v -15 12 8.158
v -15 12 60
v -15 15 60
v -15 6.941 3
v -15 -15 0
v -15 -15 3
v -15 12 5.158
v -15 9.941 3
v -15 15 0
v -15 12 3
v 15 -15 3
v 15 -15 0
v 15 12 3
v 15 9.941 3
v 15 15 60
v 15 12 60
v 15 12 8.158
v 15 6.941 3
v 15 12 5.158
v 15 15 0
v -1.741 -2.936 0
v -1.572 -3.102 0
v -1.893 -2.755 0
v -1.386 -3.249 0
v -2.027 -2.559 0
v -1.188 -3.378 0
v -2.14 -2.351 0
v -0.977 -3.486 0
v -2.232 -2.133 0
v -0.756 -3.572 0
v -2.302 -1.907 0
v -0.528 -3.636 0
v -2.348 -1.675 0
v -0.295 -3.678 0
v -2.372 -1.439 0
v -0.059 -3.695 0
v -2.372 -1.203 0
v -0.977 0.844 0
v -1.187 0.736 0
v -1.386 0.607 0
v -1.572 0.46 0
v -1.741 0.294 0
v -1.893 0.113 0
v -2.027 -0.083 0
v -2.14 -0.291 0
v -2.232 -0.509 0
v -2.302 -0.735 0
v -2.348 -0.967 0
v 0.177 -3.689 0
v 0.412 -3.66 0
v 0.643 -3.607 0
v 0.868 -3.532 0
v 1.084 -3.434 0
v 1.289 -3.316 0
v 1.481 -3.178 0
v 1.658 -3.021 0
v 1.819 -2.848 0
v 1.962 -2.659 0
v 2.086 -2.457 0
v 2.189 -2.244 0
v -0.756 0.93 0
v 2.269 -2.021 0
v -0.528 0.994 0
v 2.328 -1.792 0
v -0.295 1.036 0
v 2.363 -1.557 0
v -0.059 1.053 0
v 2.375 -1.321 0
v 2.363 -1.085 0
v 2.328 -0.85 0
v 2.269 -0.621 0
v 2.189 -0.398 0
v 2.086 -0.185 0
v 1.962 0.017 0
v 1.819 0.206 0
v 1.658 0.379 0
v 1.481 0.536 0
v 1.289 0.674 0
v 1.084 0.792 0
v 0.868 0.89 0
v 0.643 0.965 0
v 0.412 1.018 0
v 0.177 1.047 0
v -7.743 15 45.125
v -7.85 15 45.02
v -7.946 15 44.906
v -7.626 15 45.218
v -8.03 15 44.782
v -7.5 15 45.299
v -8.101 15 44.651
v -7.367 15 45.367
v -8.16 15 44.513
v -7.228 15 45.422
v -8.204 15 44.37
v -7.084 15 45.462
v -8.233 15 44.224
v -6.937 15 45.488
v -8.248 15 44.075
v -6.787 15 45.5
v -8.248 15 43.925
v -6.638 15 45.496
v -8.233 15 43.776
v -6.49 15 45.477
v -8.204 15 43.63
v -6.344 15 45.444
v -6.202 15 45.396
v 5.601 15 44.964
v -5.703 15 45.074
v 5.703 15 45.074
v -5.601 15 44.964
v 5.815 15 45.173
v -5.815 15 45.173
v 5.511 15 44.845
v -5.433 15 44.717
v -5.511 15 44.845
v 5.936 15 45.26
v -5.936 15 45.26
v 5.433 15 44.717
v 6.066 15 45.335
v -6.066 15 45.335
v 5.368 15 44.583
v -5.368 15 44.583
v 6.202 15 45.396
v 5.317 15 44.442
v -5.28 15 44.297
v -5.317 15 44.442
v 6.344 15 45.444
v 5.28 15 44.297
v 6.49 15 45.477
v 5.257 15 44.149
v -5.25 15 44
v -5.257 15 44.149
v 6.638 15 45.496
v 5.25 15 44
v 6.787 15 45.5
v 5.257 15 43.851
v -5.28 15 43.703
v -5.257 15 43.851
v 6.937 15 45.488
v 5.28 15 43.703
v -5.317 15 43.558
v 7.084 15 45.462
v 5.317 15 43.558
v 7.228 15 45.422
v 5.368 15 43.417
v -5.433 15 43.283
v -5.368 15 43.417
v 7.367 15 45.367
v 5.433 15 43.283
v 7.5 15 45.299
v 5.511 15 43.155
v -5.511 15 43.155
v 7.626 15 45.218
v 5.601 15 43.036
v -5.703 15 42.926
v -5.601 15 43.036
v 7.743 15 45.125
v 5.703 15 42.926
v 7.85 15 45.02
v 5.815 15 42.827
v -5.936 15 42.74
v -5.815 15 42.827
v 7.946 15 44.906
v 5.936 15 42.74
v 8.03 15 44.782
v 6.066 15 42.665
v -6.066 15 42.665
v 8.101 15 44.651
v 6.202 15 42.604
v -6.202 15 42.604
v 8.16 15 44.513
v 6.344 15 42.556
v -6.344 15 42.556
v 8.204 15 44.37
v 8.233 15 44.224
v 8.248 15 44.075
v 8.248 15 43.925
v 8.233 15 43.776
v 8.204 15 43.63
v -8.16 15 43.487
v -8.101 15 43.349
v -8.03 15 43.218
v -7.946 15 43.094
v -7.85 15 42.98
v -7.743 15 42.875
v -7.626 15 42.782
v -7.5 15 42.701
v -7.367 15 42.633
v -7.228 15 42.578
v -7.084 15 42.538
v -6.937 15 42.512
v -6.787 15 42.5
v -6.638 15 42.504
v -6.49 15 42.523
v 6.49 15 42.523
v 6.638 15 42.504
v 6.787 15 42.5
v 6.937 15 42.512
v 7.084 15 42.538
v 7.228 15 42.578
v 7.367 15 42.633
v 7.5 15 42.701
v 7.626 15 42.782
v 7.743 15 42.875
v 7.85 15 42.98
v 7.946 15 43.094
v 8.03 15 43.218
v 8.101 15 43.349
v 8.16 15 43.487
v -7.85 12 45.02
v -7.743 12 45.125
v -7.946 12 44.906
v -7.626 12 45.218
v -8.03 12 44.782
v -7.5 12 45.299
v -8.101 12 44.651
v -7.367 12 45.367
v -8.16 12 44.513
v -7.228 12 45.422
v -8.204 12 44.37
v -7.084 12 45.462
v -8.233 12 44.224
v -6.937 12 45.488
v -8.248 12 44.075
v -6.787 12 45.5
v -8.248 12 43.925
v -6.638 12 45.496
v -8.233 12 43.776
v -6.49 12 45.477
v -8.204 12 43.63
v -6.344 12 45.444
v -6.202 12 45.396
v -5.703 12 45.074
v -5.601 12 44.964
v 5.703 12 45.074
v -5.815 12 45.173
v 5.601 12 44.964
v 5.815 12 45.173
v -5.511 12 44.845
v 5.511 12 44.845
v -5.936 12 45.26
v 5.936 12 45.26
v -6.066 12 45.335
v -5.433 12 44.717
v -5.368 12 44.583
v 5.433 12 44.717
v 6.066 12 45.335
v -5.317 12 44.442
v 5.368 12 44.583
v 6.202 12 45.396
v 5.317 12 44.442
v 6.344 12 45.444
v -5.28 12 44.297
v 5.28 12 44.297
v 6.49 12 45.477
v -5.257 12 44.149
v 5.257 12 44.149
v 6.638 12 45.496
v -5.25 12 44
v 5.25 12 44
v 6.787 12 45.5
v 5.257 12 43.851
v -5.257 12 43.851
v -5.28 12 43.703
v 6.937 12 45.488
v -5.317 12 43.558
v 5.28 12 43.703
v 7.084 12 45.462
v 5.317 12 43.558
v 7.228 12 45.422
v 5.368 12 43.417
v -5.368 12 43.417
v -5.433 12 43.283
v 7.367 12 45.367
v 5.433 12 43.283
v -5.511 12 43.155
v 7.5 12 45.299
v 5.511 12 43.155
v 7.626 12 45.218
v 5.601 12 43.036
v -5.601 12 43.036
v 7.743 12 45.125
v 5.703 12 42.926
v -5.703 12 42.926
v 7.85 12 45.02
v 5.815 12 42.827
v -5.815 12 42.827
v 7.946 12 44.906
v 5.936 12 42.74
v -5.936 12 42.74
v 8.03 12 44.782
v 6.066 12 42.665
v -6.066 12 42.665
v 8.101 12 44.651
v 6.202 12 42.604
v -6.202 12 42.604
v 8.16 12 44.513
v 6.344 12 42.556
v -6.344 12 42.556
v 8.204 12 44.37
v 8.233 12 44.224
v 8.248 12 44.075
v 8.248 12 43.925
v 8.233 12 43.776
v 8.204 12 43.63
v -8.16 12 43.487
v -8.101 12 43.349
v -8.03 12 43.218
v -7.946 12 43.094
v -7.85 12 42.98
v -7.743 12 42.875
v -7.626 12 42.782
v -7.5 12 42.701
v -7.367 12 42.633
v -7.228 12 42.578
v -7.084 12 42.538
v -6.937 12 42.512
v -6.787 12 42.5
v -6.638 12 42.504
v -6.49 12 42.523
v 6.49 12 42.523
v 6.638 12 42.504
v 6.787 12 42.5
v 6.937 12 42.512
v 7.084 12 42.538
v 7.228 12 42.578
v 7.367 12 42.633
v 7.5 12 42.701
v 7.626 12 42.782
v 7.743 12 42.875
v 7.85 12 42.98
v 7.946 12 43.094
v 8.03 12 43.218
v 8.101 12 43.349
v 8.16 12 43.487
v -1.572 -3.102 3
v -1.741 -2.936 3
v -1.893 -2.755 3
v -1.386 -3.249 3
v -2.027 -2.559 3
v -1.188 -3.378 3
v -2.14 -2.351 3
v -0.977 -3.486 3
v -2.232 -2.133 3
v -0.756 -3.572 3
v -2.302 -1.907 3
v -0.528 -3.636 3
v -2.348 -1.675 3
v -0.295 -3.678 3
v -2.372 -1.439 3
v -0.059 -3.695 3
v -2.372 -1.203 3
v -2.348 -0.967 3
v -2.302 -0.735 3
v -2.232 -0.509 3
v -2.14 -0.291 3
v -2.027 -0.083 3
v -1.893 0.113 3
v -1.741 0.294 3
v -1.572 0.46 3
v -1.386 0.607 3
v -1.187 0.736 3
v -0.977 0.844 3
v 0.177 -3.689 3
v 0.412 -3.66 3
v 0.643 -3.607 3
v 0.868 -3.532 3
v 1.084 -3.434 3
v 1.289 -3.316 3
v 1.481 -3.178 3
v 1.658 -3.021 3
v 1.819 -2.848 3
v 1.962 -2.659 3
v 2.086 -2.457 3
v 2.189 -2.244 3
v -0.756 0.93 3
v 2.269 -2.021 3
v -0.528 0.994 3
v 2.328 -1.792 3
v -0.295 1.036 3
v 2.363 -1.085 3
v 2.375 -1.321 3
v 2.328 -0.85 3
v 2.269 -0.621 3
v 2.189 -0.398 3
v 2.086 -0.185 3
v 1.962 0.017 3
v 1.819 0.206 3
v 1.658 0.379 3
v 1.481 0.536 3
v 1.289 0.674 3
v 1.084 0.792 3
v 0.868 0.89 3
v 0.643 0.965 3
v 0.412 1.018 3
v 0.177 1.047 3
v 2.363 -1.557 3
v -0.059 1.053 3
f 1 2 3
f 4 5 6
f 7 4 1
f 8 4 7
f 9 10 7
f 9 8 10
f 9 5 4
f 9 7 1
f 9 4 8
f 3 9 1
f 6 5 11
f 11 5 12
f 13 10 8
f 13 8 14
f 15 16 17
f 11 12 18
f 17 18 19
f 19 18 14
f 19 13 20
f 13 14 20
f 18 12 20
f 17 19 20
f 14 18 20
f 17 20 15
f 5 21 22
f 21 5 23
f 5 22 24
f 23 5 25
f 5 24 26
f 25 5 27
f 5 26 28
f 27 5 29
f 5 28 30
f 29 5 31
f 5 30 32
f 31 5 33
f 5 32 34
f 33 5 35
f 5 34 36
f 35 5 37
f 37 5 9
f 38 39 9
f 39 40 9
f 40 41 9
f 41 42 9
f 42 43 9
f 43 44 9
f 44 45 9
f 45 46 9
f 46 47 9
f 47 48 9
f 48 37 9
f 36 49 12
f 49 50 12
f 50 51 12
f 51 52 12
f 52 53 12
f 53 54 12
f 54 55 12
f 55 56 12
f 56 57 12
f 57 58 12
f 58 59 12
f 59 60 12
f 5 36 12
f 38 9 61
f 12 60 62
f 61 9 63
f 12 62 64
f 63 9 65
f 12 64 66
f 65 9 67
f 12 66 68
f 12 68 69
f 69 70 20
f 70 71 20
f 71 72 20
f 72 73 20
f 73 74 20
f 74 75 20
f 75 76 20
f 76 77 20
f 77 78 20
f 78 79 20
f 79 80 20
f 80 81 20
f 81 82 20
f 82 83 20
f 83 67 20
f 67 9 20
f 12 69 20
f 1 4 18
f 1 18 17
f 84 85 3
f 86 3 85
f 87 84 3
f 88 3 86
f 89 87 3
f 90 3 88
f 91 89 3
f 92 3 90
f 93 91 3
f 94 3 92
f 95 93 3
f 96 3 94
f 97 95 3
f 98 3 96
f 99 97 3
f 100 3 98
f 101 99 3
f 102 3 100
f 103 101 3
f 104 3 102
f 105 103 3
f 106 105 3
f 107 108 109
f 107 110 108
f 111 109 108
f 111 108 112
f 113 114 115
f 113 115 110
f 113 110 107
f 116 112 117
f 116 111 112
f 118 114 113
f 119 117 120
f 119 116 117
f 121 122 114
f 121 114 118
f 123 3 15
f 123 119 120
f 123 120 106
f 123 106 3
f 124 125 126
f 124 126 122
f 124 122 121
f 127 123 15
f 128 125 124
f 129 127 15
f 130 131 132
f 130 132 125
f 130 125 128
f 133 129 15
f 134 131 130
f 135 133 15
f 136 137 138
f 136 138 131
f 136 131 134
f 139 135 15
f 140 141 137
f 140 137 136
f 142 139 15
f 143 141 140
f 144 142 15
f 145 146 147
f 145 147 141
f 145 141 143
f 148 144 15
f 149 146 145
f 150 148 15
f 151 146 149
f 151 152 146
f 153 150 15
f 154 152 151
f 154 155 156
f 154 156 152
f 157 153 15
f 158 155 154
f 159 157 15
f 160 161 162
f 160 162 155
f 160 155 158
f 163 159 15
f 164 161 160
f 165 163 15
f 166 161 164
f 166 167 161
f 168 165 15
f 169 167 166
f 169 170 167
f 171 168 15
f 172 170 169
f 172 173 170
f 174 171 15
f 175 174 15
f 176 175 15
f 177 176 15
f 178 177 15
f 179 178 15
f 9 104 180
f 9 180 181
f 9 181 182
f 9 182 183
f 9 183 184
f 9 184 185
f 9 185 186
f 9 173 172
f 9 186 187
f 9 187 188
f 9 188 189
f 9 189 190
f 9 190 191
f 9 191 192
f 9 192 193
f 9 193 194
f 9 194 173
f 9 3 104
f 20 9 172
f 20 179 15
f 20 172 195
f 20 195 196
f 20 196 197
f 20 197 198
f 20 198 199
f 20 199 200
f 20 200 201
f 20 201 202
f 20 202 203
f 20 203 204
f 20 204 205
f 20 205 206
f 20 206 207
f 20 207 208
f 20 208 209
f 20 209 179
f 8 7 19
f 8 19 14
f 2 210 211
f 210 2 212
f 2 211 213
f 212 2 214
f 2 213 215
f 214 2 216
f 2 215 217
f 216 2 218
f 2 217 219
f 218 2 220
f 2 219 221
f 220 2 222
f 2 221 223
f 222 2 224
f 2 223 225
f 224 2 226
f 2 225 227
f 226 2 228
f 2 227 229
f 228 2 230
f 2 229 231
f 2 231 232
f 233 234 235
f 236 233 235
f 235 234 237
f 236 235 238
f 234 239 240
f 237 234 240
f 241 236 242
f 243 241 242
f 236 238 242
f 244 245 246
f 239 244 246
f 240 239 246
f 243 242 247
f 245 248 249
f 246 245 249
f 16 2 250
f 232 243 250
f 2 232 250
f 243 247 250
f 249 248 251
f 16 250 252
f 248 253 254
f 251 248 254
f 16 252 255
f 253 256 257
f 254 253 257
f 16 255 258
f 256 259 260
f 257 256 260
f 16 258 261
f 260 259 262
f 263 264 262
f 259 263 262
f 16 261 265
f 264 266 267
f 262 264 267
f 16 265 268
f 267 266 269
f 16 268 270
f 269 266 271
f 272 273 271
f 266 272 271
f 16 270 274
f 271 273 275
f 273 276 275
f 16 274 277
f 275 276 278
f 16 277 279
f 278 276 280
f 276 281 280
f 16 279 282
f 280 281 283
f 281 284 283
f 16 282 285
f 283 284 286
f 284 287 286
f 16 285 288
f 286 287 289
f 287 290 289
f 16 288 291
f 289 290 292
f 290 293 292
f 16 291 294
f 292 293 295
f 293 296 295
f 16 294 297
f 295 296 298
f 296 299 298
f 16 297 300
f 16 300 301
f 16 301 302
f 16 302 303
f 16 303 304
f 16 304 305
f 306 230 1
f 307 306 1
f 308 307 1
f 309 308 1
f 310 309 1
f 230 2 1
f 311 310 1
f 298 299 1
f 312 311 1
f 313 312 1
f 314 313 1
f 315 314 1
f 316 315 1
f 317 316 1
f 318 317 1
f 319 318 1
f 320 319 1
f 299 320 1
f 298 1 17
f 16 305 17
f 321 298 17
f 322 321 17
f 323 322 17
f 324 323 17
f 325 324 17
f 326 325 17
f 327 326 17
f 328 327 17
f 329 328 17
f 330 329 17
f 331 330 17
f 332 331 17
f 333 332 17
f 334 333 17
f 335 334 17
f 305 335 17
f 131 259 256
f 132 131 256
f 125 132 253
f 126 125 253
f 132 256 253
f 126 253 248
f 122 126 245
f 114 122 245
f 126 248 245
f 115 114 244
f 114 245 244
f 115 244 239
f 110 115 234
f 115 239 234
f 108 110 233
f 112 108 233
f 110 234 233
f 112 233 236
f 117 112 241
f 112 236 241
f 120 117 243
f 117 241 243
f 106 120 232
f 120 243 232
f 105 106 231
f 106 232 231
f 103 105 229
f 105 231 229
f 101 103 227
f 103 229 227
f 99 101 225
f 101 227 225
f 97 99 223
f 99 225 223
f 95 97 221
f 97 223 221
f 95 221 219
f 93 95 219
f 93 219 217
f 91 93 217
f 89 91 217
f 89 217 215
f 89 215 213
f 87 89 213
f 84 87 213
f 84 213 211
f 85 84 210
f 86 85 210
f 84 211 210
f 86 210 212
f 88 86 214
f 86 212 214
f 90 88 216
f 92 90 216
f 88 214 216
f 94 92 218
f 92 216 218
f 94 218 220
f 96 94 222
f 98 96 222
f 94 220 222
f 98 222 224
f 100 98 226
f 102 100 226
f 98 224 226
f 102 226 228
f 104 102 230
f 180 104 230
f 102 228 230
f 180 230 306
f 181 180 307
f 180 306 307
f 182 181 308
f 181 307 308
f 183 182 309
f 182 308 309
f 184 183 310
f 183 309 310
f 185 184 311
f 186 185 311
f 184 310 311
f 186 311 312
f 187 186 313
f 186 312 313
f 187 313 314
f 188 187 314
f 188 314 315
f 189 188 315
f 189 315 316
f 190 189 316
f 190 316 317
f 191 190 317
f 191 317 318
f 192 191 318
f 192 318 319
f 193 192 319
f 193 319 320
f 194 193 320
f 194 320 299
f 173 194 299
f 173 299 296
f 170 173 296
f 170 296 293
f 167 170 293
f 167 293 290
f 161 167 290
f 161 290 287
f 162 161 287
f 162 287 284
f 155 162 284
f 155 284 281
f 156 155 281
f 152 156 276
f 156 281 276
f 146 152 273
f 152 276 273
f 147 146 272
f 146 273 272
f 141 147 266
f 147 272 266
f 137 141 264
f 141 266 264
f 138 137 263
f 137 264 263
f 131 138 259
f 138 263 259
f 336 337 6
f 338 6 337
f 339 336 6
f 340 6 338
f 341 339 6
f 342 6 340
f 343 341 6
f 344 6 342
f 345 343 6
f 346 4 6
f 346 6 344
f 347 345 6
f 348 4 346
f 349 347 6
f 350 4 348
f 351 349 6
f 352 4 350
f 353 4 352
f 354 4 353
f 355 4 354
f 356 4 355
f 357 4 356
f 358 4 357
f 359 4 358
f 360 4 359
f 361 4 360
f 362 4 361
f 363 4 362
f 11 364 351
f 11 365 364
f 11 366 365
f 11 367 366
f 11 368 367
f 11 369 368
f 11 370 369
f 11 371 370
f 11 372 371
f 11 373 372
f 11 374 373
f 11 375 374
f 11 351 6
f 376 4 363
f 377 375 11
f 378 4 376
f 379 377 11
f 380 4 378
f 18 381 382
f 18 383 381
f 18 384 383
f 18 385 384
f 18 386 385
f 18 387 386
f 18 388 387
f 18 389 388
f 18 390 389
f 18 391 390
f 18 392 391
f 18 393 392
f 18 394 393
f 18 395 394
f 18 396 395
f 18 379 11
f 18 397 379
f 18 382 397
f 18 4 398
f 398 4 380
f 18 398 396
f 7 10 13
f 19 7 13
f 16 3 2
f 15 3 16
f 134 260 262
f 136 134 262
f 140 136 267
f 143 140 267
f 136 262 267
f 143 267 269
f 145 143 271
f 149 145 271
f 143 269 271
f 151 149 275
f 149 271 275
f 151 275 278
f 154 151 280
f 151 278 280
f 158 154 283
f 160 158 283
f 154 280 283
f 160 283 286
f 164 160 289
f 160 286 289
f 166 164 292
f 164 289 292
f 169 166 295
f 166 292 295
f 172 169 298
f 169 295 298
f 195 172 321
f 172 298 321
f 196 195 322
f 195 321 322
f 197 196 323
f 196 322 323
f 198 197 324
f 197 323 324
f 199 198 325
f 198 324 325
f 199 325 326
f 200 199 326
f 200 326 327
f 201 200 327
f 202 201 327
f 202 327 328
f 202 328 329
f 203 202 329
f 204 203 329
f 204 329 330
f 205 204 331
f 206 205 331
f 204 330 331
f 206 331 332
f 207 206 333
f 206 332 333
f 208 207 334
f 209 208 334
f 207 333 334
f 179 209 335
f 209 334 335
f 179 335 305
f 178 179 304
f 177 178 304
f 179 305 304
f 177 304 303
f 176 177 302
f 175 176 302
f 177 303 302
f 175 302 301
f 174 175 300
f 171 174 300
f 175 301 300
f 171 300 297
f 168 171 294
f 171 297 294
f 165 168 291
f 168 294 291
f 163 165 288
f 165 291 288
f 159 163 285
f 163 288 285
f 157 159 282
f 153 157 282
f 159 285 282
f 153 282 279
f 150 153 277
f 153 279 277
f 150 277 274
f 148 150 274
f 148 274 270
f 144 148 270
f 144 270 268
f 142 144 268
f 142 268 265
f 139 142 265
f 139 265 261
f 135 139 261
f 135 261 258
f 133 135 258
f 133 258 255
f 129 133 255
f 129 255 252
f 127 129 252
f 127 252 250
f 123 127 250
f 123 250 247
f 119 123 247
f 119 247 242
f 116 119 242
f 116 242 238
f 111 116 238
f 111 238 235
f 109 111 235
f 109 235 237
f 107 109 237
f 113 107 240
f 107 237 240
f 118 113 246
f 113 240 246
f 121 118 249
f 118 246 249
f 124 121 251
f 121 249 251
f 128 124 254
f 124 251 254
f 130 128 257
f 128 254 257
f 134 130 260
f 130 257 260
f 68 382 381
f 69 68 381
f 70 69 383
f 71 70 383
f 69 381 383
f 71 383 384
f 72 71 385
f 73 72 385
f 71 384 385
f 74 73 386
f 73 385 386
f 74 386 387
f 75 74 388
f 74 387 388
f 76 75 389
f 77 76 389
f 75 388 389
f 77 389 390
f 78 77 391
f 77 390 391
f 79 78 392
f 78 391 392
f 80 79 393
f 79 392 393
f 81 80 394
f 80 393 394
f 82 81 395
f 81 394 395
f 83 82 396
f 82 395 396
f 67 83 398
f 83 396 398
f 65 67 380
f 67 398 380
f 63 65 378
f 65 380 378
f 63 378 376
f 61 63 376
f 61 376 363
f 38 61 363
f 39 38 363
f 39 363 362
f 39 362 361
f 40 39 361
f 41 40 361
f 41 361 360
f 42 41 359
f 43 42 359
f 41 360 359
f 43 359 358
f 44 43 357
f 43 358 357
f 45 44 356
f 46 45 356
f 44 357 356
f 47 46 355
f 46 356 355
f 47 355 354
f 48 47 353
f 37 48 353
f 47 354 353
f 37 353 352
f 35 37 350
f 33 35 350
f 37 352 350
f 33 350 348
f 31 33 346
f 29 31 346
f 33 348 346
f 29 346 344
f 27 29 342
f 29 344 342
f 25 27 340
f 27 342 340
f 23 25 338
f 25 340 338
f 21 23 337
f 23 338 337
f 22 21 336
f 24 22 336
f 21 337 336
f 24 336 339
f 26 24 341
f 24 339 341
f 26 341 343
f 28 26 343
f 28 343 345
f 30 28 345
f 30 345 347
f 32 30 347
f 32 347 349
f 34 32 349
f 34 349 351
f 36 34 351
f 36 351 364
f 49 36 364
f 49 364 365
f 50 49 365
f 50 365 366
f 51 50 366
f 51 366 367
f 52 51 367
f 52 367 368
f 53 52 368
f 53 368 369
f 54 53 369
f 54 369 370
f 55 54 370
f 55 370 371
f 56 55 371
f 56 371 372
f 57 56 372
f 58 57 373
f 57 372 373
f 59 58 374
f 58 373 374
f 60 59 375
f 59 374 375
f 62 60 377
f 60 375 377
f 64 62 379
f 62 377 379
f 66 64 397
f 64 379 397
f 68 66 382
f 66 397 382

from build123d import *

# Parameters (mm, degrees)
F0_W      = 30
F0_H      = 30
F1_DEPTH  = 3
F2_W      = 30
F2_H      = 3
F3_DEPTH  = 57
F4_R      = 2.375
F5_DEPTH  = 3
F6_R      = 1.5
F7_DEPTH  = 3
F10_DEPTH = 30


with BuildPart() as f1:
    # F0 (on Top) → F1 (new body)
    with BuildSketch(Plane.XY):
        Rectangle(F0_W, F0_H)
    extrude(amount=F1_DEPTH)

    # F2 (on face) → F3 (join)
    with BuildSketch(Plane.XY.offset(3)):
        with Locations((0, 13.5)):
            Rectangle(F2_W, F2_H)
    extrude(amount=F3_DEPTH)

    # F4 (on face) → F5 (cut, through all)
    with BuildSketch(Plane.XY.offset(3)):
        with Locations((0, -1.3210215056)):
            Circle(F4_R)
    extrude(amount=-F5_DEPTH, mode=Mode.SUBTRACT)

    # F6 (on face) → F7 (cut, through all)
    with BuildSketch(Plane.XZ.offset(-12)):
        with Locations((-6.75, 44)):
            Circle(F6_R)
        with BuildLine():
            ThreePointArc((8.25, 44), (6.75, 45.5), (5.25, 44))
            ThreePointArc((5.25, 44), (6.75, 42.5), (8.25, 44))
        make_face()
    extrude(amount=-F7_DEPTH, mode=Mode.SUBTRACT)

    # F9 (on offset) → F10 (join, through all)
    with BuildSketch(Plane(origin=(-15, 0, 0), x_dir=(0, -1, 0), z_dir=(-1, 0, 0))):
        Polygon((-12, 5.1583419554), (-9.9405581132, 3), (-6.9405581132, 3), (-12, 8.1583419554), align=None)
    extrude(amount=-F10_DEPTH)


solid = f1.part
